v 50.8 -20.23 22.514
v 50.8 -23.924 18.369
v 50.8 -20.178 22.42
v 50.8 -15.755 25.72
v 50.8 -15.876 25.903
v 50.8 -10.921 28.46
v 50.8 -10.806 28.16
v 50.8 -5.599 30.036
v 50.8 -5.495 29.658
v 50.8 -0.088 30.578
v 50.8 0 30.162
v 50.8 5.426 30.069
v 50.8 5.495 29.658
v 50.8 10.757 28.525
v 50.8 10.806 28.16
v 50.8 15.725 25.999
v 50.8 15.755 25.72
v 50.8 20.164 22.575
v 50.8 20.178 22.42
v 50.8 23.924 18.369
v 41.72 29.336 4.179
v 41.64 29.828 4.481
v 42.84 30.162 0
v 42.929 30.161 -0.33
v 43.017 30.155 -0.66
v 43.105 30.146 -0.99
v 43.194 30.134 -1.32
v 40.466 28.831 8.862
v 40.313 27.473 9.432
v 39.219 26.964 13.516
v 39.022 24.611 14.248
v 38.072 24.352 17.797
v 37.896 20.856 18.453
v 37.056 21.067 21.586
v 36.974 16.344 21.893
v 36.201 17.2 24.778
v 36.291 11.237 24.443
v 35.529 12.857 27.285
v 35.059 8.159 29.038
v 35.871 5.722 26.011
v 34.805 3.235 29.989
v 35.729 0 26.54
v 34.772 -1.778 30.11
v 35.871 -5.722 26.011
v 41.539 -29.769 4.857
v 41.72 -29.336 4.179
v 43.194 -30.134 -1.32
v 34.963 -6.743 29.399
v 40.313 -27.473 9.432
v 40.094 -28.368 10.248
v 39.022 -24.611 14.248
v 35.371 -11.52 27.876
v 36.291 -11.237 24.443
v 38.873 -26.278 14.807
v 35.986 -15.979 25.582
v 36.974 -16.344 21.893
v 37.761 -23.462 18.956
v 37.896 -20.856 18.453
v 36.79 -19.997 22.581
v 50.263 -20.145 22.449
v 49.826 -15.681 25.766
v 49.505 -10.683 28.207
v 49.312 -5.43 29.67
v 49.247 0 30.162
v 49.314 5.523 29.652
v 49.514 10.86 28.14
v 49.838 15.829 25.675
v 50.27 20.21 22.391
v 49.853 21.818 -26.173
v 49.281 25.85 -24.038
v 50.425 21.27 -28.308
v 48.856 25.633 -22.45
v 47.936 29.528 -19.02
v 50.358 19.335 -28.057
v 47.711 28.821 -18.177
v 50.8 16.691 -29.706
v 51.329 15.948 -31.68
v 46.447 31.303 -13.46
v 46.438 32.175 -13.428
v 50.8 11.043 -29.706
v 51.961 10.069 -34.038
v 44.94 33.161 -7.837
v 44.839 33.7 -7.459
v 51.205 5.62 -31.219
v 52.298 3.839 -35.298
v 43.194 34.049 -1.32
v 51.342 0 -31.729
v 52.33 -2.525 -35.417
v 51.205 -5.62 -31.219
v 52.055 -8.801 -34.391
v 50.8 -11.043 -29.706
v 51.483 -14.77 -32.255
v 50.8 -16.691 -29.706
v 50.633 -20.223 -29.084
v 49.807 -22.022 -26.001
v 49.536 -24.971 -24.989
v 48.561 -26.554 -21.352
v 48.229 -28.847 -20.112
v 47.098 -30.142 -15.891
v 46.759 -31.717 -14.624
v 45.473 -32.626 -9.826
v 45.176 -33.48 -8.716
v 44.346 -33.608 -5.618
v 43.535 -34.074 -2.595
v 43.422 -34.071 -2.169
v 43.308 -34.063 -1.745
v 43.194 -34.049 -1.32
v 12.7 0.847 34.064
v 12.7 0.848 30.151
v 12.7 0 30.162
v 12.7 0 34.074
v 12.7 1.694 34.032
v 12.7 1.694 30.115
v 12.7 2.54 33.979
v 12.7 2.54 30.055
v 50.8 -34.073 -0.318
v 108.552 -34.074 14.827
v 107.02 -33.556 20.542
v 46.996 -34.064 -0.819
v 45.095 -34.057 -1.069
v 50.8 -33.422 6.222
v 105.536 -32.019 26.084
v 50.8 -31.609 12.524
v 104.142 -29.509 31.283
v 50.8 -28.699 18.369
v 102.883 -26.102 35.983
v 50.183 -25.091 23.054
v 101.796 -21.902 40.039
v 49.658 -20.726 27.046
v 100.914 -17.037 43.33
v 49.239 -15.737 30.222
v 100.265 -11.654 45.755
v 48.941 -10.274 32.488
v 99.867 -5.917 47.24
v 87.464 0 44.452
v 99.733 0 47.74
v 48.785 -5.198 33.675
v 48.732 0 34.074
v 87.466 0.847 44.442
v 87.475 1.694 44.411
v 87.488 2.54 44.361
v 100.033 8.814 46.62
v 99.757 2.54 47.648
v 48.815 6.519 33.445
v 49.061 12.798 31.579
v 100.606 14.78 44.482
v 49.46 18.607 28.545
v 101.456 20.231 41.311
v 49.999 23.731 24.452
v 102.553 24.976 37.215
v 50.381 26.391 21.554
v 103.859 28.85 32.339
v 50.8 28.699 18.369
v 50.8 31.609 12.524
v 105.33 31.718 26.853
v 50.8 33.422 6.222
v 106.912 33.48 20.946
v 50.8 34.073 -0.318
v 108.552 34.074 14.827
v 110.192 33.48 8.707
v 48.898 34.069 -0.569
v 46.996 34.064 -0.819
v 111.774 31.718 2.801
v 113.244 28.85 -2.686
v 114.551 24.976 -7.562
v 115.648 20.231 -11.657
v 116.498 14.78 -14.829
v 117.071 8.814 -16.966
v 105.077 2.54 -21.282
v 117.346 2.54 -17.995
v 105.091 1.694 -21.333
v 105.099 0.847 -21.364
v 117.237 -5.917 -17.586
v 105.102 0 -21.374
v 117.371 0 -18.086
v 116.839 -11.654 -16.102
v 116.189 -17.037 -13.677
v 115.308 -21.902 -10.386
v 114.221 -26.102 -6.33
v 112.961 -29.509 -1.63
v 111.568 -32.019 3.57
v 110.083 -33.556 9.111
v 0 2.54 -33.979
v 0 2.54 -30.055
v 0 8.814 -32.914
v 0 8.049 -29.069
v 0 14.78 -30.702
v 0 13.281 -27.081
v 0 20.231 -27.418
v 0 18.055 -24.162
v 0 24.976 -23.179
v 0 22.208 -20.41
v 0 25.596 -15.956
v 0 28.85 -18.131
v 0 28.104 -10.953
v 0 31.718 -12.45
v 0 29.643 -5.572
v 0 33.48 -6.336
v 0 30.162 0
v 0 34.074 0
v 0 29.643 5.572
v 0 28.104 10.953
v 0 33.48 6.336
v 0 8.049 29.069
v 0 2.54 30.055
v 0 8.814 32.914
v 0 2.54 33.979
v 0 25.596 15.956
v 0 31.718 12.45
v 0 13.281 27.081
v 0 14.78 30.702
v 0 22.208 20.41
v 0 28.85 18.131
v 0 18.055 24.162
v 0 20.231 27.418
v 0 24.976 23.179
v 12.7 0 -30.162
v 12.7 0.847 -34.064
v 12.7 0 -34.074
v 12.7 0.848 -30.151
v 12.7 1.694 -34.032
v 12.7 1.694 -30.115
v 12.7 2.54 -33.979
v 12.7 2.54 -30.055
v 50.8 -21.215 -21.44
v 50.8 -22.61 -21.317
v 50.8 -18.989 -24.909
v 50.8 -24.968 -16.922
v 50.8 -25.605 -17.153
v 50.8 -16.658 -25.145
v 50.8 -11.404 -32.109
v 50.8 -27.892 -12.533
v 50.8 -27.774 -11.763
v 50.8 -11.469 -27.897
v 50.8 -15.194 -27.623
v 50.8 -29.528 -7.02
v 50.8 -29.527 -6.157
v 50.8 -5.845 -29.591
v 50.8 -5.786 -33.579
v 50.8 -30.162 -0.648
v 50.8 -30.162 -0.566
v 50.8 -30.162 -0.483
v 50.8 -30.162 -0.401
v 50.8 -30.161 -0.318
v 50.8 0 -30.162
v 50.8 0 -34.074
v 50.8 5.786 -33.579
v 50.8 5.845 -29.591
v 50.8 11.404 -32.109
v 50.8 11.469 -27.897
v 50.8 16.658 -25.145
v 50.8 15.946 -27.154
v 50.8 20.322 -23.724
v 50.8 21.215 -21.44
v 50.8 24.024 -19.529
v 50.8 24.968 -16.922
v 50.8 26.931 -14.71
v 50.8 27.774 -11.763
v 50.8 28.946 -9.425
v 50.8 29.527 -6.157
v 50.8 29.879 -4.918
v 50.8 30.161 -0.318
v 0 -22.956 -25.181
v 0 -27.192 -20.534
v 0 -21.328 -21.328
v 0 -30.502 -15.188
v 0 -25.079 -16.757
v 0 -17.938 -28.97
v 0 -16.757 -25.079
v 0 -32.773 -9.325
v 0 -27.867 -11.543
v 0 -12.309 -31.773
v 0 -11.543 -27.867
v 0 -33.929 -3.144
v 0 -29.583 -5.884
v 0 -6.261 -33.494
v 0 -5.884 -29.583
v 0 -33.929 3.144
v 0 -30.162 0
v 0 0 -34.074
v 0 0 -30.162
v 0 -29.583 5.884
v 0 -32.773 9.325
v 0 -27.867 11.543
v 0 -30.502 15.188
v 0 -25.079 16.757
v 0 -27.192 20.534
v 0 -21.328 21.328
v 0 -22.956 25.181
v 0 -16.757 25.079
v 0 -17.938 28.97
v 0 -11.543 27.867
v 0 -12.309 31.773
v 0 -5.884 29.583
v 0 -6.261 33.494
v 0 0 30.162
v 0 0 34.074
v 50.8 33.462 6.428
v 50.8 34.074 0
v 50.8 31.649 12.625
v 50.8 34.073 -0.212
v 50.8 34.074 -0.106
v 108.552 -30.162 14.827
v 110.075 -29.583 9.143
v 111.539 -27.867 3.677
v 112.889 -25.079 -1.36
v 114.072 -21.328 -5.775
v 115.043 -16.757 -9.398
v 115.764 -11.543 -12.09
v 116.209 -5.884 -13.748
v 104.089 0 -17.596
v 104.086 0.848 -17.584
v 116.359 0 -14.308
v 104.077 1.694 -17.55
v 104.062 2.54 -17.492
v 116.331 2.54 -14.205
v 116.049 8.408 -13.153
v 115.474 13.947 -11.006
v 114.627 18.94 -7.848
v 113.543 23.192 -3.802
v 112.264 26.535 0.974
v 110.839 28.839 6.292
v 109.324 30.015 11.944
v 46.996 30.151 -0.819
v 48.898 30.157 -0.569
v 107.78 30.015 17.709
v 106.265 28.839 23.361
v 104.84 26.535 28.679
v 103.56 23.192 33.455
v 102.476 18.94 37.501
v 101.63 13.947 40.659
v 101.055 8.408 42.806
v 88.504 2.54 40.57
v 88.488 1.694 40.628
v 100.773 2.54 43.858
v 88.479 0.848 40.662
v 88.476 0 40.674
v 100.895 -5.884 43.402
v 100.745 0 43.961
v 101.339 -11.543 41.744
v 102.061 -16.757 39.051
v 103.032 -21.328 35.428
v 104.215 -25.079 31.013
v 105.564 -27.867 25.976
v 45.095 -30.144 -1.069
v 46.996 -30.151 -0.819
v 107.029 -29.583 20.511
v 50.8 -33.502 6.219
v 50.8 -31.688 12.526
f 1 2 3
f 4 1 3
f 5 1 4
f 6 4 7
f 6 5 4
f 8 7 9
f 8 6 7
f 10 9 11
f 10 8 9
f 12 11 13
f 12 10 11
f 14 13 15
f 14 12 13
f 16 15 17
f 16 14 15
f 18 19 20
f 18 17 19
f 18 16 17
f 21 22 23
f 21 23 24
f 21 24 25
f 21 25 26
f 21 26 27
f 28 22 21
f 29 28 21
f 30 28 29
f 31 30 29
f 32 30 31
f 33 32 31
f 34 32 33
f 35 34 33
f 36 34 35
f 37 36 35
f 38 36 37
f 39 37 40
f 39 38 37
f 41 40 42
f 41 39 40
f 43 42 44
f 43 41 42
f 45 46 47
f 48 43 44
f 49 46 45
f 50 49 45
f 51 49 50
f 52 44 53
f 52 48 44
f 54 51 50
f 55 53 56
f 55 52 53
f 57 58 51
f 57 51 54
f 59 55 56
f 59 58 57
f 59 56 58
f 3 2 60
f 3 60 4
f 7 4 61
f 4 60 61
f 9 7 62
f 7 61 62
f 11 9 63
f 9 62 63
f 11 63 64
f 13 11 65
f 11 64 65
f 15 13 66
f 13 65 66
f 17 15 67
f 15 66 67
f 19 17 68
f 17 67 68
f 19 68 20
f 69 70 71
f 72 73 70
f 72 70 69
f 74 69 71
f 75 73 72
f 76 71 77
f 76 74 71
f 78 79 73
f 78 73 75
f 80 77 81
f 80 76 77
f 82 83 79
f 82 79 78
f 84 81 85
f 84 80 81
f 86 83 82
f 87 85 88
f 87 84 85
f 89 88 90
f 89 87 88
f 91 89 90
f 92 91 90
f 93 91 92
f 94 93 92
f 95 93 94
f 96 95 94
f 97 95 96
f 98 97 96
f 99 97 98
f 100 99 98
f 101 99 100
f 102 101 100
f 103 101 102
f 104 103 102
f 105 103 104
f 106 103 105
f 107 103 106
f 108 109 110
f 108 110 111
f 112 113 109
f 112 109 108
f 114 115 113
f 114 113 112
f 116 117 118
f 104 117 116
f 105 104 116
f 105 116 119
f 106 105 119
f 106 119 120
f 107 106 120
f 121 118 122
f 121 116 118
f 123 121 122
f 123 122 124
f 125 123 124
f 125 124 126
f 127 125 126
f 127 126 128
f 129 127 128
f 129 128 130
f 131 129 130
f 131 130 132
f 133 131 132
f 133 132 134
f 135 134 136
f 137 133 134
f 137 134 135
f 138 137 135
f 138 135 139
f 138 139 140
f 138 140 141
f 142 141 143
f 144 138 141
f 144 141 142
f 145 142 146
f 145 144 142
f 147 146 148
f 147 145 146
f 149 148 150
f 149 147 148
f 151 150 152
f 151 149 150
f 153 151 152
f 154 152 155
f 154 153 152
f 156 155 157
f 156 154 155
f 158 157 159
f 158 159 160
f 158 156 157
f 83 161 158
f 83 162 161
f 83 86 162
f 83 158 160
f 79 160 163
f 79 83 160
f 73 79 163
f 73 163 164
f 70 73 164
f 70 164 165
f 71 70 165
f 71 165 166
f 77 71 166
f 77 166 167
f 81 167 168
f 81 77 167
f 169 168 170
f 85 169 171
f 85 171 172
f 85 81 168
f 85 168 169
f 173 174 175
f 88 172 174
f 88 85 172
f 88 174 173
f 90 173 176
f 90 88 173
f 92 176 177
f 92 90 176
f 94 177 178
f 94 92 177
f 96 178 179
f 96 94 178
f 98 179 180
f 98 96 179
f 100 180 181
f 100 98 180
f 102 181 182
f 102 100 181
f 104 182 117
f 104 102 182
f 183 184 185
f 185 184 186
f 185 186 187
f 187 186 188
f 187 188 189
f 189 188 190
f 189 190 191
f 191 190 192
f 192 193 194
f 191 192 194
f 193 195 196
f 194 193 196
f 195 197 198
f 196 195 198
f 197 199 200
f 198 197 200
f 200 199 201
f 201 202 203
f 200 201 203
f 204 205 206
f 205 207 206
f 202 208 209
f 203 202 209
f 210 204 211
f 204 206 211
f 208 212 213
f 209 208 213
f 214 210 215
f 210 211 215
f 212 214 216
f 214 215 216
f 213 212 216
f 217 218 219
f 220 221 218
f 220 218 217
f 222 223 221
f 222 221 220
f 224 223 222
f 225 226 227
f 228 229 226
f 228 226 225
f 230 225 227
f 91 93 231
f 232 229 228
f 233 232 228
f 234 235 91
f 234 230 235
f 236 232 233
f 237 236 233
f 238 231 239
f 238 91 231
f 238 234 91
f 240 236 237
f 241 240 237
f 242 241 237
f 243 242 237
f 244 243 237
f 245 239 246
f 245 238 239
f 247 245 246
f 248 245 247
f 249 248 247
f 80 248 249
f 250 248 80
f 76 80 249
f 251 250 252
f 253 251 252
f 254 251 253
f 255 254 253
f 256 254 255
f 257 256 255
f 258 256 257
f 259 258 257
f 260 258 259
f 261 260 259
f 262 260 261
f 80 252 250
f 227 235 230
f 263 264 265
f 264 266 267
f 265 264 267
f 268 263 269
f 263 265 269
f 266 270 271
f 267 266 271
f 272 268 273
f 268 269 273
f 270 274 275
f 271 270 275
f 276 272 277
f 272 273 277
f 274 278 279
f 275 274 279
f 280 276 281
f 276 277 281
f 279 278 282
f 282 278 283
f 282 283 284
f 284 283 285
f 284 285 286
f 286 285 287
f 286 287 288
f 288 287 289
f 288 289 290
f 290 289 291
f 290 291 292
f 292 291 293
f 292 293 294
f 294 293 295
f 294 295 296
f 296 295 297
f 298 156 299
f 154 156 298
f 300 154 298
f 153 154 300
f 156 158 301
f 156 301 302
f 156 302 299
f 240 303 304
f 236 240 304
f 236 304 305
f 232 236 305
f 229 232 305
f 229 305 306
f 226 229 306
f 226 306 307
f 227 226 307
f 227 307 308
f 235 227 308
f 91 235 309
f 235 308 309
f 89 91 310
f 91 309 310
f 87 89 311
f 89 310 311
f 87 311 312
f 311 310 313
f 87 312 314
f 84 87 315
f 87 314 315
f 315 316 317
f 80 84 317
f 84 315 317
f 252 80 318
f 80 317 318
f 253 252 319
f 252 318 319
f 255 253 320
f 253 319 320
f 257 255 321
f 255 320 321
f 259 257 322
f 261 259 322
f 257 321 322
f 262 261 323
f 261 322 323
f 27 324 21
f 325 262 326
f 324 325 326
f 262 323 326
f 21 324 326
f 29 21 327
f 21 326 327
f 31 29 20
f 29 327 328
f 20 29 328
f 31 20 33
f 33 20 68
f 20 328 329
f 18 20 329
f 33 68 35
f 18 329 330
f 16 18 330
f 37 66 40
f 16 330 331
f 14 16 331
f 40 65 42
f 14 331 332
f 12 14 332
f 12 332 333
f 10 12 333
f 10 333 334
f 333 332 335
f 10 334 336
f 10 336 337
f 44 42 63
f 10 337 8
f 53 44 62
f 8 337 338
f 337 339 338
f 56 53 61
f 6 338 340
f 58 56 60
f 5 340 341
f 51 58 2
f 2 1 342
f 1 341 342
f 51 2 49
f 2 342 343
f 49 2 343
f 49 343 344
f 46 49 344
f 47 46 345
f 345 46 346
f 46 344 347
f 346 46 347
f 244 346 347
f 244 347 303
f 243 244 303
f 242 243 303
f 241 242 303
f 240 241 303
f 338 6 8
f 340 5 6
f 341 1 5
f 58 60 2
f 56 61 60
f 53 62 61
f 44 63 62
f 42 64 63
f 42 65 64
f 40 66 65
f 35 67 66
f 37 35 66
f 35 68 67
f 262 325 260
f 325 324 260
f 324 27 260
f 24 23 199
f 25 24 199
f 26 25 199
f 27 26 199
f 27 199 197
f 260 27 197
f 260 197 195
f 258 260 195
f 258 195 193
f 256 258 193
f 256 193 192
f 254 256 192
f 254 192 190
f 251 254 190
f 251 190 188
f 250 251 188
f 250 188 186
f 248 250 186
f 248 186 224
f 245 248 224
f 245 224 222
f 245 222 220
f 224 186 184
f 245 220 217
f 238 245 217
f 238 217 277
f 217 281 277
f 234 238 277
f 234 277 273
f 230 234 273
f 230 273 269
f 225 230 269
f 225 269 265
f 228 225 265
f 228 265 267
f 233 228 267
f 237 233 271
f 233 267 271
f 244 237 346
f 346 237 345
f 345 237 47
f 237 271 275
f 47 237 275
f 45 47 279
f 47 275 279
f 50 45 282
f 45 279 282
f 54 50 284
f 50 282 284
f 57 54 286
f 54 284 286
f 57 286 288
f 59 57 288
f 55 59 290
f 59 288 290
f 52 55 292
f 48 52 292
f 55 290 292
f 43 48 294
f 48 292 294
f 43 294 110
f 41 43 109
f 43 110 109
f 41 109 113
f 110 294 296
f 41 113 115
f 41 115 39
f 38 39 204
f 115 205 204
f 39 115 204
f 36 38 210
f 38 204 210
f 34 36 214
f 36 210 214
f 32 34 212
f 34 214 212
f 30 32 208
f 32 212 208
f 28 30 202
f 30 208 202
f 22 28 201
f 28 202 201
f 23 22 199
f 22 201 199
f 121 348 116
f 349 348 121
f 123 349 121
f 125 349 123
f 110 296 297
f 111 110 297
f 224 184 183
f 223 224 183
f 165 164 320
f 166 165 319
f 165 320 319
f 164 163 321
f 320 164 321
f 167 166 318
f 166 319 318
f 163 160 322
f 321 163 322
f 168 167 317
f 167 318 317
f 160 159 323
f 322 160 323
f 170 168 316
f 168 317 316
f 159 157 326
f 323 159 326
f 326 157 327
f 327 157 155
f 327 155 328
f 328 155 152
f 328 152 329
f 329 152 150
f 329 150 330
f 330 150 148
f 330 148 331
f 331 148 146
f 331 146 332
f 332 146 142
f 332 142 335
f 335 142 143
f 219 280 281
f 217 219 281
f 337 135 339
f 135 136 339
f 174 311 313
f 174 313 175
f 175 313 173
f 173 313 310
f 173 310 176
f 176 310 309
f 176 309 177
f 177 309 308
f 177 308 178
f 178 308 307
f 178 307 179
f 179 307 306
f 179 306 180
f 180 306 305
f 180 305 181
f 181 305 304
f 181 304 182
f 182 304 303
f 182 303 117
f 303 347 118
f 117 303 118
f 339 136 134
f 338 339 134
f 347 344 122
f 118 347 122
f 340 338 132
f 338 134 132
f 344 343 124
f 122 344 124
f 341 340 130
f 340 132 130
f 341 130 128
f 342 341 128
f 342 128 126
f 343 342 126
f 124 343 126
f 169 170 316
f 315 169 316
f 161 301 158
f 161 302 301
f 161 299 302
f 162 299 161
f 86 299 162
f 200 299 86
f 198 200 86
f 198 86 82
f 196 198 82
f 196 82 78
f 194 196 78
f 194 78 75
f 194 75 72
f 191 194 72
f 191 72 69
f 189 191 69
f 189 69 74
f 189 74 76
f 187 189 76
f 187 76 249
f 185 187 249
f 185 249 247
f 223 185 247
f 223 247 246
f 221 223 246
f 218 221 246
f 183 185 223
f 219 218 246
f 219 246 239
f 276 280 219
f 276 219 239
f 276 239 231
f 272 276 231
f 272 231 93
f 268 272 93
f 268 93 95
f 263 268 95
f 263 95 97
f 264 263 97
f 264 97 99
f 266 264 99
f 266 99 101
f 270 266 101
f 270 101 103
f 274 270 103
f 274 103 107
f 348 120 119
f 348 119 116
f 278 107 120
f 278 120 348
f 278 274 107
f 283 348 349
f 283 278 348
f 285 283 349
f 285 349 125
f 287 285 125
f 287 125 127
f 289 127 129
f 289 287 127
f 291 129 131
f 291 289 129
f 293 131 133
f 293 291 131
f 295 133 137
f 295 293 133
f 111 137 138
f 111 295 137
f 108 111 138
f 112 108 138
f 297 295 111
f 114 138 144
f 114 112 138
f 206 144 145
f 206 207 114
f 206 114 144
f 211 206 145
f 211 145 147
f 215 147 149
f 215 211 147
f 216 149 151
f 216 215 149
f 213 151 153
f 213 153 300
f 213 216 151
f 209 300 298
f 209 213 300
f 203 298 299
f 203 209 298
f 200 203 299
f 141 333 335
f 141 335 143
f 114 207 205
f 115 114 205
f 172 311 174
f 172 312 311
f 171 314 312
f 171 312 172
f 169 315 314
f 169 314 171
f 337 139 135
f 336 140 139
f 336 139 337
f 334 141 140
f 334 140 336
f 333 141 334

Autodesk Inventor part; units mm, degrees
ref_plane "YZ Plane" through (0, 0, 0) normal (1, 0, 0) x (0, 1, 0)
ref_plane "XZ Plane" through (0, 0, 0) normal (0, 1, 0) x (-1, 0, 0)
sketch "Sketch1" plane through (0, 0, 0) normal (1, 0, 0) x (0, 1, 0)
  circle A0 centre (0, 0) radius 30.1625
  circle A1 centre (0, 0) radius 34.0741
  dimension "d0" = 60.325
  dimension "d2" = 3.9116
extrude "Extrusion1" add sketch "Sketch1" along normal blind 50.8
sketch "Sketch2" plane through (50.8, 0, 0) normal (1, 0, 0) x (0, 0, -1)
  circle A0 centre (0, 0) radius 30.1625 projected
  circle A1 centre (0, 0) radius 34.0741 projected
  point P0 (-34.0741, 0)
ref_plane "Work Plane1" through (50.8, 0, 34.0741) normal (0, 0, 1) x (1, 0, 0)
sketch "Sketch3" plane through (50.8, 0, 34.0741) normal (0, 0, 1) x (1, 0, 0)
  line L0 (0.0025, 3.75) -> (0.0025, -3.004)
  point P0 (-50.8, 0)
ref_plane "Work Plane2" through (50.8025, 3.75, 34.0741) normal (-0.9659, 0, -0.2588) x (0, -1, 0)
sketch "Sketch4" plane through (50.8025, 3.75, 34.0741) normal (-0.9659, 0, -0.2588) x (0, -1, 0)
  circle A0 centre (3.75, -33.5383) radius 30.1625
  circle A1 centre (3.75, -33.5383) radius 34.0741
  point P0 (3.75, -19.7644)
  dimension "d6" = 60.325
  dimension "d8" = 3.9116
extrude "Extrusion2" add sketch "Sketch4" against normal blind 50.8 and the other way blind 16.51
sketch "Sketch12" plane through (108.5519, 0, 14.8266) normal (0.9659, 0, 0.2588) x (0.2588, 0, -0.9659)
  line L0 (-38.7204, 0) -> (38.3341, 0)
  line L1 (38.3341, 0) -> (38.3341, 2.54)
  line L2 (38.3341, 2.54) -> (-38.7204, 2.54)
  line L3 (-38.7204, 2.54) -> (-38.7204, 0)
  point P0 (-13.7739, 0)
  dimension "d23" = 2.54
extrude "Extrusion5" cut sketch "Sketch12" against normal blind 12.7
sketch "Sketch13" plane through (0, 0, 0) normal (-1, 0, 0) x (0, 0, 1)
  line L0 (-39.4939, 0) -> (40.3288, 0)
  line L1 (40.3288, 0) -> (40.3288, 2.54)
  line L2 (40.3288, 2.54) -> (-39.4939, 2.54)
  line L3 (-39.4939, 2.54) -> (-39.4939, 0)
  dimension "d26" = 2.54
extrude "Extrusion6" cut sketch "Sketch13" against normal blind 12.7
properties part number "pvc_15bend" material "PVC-Piping"
